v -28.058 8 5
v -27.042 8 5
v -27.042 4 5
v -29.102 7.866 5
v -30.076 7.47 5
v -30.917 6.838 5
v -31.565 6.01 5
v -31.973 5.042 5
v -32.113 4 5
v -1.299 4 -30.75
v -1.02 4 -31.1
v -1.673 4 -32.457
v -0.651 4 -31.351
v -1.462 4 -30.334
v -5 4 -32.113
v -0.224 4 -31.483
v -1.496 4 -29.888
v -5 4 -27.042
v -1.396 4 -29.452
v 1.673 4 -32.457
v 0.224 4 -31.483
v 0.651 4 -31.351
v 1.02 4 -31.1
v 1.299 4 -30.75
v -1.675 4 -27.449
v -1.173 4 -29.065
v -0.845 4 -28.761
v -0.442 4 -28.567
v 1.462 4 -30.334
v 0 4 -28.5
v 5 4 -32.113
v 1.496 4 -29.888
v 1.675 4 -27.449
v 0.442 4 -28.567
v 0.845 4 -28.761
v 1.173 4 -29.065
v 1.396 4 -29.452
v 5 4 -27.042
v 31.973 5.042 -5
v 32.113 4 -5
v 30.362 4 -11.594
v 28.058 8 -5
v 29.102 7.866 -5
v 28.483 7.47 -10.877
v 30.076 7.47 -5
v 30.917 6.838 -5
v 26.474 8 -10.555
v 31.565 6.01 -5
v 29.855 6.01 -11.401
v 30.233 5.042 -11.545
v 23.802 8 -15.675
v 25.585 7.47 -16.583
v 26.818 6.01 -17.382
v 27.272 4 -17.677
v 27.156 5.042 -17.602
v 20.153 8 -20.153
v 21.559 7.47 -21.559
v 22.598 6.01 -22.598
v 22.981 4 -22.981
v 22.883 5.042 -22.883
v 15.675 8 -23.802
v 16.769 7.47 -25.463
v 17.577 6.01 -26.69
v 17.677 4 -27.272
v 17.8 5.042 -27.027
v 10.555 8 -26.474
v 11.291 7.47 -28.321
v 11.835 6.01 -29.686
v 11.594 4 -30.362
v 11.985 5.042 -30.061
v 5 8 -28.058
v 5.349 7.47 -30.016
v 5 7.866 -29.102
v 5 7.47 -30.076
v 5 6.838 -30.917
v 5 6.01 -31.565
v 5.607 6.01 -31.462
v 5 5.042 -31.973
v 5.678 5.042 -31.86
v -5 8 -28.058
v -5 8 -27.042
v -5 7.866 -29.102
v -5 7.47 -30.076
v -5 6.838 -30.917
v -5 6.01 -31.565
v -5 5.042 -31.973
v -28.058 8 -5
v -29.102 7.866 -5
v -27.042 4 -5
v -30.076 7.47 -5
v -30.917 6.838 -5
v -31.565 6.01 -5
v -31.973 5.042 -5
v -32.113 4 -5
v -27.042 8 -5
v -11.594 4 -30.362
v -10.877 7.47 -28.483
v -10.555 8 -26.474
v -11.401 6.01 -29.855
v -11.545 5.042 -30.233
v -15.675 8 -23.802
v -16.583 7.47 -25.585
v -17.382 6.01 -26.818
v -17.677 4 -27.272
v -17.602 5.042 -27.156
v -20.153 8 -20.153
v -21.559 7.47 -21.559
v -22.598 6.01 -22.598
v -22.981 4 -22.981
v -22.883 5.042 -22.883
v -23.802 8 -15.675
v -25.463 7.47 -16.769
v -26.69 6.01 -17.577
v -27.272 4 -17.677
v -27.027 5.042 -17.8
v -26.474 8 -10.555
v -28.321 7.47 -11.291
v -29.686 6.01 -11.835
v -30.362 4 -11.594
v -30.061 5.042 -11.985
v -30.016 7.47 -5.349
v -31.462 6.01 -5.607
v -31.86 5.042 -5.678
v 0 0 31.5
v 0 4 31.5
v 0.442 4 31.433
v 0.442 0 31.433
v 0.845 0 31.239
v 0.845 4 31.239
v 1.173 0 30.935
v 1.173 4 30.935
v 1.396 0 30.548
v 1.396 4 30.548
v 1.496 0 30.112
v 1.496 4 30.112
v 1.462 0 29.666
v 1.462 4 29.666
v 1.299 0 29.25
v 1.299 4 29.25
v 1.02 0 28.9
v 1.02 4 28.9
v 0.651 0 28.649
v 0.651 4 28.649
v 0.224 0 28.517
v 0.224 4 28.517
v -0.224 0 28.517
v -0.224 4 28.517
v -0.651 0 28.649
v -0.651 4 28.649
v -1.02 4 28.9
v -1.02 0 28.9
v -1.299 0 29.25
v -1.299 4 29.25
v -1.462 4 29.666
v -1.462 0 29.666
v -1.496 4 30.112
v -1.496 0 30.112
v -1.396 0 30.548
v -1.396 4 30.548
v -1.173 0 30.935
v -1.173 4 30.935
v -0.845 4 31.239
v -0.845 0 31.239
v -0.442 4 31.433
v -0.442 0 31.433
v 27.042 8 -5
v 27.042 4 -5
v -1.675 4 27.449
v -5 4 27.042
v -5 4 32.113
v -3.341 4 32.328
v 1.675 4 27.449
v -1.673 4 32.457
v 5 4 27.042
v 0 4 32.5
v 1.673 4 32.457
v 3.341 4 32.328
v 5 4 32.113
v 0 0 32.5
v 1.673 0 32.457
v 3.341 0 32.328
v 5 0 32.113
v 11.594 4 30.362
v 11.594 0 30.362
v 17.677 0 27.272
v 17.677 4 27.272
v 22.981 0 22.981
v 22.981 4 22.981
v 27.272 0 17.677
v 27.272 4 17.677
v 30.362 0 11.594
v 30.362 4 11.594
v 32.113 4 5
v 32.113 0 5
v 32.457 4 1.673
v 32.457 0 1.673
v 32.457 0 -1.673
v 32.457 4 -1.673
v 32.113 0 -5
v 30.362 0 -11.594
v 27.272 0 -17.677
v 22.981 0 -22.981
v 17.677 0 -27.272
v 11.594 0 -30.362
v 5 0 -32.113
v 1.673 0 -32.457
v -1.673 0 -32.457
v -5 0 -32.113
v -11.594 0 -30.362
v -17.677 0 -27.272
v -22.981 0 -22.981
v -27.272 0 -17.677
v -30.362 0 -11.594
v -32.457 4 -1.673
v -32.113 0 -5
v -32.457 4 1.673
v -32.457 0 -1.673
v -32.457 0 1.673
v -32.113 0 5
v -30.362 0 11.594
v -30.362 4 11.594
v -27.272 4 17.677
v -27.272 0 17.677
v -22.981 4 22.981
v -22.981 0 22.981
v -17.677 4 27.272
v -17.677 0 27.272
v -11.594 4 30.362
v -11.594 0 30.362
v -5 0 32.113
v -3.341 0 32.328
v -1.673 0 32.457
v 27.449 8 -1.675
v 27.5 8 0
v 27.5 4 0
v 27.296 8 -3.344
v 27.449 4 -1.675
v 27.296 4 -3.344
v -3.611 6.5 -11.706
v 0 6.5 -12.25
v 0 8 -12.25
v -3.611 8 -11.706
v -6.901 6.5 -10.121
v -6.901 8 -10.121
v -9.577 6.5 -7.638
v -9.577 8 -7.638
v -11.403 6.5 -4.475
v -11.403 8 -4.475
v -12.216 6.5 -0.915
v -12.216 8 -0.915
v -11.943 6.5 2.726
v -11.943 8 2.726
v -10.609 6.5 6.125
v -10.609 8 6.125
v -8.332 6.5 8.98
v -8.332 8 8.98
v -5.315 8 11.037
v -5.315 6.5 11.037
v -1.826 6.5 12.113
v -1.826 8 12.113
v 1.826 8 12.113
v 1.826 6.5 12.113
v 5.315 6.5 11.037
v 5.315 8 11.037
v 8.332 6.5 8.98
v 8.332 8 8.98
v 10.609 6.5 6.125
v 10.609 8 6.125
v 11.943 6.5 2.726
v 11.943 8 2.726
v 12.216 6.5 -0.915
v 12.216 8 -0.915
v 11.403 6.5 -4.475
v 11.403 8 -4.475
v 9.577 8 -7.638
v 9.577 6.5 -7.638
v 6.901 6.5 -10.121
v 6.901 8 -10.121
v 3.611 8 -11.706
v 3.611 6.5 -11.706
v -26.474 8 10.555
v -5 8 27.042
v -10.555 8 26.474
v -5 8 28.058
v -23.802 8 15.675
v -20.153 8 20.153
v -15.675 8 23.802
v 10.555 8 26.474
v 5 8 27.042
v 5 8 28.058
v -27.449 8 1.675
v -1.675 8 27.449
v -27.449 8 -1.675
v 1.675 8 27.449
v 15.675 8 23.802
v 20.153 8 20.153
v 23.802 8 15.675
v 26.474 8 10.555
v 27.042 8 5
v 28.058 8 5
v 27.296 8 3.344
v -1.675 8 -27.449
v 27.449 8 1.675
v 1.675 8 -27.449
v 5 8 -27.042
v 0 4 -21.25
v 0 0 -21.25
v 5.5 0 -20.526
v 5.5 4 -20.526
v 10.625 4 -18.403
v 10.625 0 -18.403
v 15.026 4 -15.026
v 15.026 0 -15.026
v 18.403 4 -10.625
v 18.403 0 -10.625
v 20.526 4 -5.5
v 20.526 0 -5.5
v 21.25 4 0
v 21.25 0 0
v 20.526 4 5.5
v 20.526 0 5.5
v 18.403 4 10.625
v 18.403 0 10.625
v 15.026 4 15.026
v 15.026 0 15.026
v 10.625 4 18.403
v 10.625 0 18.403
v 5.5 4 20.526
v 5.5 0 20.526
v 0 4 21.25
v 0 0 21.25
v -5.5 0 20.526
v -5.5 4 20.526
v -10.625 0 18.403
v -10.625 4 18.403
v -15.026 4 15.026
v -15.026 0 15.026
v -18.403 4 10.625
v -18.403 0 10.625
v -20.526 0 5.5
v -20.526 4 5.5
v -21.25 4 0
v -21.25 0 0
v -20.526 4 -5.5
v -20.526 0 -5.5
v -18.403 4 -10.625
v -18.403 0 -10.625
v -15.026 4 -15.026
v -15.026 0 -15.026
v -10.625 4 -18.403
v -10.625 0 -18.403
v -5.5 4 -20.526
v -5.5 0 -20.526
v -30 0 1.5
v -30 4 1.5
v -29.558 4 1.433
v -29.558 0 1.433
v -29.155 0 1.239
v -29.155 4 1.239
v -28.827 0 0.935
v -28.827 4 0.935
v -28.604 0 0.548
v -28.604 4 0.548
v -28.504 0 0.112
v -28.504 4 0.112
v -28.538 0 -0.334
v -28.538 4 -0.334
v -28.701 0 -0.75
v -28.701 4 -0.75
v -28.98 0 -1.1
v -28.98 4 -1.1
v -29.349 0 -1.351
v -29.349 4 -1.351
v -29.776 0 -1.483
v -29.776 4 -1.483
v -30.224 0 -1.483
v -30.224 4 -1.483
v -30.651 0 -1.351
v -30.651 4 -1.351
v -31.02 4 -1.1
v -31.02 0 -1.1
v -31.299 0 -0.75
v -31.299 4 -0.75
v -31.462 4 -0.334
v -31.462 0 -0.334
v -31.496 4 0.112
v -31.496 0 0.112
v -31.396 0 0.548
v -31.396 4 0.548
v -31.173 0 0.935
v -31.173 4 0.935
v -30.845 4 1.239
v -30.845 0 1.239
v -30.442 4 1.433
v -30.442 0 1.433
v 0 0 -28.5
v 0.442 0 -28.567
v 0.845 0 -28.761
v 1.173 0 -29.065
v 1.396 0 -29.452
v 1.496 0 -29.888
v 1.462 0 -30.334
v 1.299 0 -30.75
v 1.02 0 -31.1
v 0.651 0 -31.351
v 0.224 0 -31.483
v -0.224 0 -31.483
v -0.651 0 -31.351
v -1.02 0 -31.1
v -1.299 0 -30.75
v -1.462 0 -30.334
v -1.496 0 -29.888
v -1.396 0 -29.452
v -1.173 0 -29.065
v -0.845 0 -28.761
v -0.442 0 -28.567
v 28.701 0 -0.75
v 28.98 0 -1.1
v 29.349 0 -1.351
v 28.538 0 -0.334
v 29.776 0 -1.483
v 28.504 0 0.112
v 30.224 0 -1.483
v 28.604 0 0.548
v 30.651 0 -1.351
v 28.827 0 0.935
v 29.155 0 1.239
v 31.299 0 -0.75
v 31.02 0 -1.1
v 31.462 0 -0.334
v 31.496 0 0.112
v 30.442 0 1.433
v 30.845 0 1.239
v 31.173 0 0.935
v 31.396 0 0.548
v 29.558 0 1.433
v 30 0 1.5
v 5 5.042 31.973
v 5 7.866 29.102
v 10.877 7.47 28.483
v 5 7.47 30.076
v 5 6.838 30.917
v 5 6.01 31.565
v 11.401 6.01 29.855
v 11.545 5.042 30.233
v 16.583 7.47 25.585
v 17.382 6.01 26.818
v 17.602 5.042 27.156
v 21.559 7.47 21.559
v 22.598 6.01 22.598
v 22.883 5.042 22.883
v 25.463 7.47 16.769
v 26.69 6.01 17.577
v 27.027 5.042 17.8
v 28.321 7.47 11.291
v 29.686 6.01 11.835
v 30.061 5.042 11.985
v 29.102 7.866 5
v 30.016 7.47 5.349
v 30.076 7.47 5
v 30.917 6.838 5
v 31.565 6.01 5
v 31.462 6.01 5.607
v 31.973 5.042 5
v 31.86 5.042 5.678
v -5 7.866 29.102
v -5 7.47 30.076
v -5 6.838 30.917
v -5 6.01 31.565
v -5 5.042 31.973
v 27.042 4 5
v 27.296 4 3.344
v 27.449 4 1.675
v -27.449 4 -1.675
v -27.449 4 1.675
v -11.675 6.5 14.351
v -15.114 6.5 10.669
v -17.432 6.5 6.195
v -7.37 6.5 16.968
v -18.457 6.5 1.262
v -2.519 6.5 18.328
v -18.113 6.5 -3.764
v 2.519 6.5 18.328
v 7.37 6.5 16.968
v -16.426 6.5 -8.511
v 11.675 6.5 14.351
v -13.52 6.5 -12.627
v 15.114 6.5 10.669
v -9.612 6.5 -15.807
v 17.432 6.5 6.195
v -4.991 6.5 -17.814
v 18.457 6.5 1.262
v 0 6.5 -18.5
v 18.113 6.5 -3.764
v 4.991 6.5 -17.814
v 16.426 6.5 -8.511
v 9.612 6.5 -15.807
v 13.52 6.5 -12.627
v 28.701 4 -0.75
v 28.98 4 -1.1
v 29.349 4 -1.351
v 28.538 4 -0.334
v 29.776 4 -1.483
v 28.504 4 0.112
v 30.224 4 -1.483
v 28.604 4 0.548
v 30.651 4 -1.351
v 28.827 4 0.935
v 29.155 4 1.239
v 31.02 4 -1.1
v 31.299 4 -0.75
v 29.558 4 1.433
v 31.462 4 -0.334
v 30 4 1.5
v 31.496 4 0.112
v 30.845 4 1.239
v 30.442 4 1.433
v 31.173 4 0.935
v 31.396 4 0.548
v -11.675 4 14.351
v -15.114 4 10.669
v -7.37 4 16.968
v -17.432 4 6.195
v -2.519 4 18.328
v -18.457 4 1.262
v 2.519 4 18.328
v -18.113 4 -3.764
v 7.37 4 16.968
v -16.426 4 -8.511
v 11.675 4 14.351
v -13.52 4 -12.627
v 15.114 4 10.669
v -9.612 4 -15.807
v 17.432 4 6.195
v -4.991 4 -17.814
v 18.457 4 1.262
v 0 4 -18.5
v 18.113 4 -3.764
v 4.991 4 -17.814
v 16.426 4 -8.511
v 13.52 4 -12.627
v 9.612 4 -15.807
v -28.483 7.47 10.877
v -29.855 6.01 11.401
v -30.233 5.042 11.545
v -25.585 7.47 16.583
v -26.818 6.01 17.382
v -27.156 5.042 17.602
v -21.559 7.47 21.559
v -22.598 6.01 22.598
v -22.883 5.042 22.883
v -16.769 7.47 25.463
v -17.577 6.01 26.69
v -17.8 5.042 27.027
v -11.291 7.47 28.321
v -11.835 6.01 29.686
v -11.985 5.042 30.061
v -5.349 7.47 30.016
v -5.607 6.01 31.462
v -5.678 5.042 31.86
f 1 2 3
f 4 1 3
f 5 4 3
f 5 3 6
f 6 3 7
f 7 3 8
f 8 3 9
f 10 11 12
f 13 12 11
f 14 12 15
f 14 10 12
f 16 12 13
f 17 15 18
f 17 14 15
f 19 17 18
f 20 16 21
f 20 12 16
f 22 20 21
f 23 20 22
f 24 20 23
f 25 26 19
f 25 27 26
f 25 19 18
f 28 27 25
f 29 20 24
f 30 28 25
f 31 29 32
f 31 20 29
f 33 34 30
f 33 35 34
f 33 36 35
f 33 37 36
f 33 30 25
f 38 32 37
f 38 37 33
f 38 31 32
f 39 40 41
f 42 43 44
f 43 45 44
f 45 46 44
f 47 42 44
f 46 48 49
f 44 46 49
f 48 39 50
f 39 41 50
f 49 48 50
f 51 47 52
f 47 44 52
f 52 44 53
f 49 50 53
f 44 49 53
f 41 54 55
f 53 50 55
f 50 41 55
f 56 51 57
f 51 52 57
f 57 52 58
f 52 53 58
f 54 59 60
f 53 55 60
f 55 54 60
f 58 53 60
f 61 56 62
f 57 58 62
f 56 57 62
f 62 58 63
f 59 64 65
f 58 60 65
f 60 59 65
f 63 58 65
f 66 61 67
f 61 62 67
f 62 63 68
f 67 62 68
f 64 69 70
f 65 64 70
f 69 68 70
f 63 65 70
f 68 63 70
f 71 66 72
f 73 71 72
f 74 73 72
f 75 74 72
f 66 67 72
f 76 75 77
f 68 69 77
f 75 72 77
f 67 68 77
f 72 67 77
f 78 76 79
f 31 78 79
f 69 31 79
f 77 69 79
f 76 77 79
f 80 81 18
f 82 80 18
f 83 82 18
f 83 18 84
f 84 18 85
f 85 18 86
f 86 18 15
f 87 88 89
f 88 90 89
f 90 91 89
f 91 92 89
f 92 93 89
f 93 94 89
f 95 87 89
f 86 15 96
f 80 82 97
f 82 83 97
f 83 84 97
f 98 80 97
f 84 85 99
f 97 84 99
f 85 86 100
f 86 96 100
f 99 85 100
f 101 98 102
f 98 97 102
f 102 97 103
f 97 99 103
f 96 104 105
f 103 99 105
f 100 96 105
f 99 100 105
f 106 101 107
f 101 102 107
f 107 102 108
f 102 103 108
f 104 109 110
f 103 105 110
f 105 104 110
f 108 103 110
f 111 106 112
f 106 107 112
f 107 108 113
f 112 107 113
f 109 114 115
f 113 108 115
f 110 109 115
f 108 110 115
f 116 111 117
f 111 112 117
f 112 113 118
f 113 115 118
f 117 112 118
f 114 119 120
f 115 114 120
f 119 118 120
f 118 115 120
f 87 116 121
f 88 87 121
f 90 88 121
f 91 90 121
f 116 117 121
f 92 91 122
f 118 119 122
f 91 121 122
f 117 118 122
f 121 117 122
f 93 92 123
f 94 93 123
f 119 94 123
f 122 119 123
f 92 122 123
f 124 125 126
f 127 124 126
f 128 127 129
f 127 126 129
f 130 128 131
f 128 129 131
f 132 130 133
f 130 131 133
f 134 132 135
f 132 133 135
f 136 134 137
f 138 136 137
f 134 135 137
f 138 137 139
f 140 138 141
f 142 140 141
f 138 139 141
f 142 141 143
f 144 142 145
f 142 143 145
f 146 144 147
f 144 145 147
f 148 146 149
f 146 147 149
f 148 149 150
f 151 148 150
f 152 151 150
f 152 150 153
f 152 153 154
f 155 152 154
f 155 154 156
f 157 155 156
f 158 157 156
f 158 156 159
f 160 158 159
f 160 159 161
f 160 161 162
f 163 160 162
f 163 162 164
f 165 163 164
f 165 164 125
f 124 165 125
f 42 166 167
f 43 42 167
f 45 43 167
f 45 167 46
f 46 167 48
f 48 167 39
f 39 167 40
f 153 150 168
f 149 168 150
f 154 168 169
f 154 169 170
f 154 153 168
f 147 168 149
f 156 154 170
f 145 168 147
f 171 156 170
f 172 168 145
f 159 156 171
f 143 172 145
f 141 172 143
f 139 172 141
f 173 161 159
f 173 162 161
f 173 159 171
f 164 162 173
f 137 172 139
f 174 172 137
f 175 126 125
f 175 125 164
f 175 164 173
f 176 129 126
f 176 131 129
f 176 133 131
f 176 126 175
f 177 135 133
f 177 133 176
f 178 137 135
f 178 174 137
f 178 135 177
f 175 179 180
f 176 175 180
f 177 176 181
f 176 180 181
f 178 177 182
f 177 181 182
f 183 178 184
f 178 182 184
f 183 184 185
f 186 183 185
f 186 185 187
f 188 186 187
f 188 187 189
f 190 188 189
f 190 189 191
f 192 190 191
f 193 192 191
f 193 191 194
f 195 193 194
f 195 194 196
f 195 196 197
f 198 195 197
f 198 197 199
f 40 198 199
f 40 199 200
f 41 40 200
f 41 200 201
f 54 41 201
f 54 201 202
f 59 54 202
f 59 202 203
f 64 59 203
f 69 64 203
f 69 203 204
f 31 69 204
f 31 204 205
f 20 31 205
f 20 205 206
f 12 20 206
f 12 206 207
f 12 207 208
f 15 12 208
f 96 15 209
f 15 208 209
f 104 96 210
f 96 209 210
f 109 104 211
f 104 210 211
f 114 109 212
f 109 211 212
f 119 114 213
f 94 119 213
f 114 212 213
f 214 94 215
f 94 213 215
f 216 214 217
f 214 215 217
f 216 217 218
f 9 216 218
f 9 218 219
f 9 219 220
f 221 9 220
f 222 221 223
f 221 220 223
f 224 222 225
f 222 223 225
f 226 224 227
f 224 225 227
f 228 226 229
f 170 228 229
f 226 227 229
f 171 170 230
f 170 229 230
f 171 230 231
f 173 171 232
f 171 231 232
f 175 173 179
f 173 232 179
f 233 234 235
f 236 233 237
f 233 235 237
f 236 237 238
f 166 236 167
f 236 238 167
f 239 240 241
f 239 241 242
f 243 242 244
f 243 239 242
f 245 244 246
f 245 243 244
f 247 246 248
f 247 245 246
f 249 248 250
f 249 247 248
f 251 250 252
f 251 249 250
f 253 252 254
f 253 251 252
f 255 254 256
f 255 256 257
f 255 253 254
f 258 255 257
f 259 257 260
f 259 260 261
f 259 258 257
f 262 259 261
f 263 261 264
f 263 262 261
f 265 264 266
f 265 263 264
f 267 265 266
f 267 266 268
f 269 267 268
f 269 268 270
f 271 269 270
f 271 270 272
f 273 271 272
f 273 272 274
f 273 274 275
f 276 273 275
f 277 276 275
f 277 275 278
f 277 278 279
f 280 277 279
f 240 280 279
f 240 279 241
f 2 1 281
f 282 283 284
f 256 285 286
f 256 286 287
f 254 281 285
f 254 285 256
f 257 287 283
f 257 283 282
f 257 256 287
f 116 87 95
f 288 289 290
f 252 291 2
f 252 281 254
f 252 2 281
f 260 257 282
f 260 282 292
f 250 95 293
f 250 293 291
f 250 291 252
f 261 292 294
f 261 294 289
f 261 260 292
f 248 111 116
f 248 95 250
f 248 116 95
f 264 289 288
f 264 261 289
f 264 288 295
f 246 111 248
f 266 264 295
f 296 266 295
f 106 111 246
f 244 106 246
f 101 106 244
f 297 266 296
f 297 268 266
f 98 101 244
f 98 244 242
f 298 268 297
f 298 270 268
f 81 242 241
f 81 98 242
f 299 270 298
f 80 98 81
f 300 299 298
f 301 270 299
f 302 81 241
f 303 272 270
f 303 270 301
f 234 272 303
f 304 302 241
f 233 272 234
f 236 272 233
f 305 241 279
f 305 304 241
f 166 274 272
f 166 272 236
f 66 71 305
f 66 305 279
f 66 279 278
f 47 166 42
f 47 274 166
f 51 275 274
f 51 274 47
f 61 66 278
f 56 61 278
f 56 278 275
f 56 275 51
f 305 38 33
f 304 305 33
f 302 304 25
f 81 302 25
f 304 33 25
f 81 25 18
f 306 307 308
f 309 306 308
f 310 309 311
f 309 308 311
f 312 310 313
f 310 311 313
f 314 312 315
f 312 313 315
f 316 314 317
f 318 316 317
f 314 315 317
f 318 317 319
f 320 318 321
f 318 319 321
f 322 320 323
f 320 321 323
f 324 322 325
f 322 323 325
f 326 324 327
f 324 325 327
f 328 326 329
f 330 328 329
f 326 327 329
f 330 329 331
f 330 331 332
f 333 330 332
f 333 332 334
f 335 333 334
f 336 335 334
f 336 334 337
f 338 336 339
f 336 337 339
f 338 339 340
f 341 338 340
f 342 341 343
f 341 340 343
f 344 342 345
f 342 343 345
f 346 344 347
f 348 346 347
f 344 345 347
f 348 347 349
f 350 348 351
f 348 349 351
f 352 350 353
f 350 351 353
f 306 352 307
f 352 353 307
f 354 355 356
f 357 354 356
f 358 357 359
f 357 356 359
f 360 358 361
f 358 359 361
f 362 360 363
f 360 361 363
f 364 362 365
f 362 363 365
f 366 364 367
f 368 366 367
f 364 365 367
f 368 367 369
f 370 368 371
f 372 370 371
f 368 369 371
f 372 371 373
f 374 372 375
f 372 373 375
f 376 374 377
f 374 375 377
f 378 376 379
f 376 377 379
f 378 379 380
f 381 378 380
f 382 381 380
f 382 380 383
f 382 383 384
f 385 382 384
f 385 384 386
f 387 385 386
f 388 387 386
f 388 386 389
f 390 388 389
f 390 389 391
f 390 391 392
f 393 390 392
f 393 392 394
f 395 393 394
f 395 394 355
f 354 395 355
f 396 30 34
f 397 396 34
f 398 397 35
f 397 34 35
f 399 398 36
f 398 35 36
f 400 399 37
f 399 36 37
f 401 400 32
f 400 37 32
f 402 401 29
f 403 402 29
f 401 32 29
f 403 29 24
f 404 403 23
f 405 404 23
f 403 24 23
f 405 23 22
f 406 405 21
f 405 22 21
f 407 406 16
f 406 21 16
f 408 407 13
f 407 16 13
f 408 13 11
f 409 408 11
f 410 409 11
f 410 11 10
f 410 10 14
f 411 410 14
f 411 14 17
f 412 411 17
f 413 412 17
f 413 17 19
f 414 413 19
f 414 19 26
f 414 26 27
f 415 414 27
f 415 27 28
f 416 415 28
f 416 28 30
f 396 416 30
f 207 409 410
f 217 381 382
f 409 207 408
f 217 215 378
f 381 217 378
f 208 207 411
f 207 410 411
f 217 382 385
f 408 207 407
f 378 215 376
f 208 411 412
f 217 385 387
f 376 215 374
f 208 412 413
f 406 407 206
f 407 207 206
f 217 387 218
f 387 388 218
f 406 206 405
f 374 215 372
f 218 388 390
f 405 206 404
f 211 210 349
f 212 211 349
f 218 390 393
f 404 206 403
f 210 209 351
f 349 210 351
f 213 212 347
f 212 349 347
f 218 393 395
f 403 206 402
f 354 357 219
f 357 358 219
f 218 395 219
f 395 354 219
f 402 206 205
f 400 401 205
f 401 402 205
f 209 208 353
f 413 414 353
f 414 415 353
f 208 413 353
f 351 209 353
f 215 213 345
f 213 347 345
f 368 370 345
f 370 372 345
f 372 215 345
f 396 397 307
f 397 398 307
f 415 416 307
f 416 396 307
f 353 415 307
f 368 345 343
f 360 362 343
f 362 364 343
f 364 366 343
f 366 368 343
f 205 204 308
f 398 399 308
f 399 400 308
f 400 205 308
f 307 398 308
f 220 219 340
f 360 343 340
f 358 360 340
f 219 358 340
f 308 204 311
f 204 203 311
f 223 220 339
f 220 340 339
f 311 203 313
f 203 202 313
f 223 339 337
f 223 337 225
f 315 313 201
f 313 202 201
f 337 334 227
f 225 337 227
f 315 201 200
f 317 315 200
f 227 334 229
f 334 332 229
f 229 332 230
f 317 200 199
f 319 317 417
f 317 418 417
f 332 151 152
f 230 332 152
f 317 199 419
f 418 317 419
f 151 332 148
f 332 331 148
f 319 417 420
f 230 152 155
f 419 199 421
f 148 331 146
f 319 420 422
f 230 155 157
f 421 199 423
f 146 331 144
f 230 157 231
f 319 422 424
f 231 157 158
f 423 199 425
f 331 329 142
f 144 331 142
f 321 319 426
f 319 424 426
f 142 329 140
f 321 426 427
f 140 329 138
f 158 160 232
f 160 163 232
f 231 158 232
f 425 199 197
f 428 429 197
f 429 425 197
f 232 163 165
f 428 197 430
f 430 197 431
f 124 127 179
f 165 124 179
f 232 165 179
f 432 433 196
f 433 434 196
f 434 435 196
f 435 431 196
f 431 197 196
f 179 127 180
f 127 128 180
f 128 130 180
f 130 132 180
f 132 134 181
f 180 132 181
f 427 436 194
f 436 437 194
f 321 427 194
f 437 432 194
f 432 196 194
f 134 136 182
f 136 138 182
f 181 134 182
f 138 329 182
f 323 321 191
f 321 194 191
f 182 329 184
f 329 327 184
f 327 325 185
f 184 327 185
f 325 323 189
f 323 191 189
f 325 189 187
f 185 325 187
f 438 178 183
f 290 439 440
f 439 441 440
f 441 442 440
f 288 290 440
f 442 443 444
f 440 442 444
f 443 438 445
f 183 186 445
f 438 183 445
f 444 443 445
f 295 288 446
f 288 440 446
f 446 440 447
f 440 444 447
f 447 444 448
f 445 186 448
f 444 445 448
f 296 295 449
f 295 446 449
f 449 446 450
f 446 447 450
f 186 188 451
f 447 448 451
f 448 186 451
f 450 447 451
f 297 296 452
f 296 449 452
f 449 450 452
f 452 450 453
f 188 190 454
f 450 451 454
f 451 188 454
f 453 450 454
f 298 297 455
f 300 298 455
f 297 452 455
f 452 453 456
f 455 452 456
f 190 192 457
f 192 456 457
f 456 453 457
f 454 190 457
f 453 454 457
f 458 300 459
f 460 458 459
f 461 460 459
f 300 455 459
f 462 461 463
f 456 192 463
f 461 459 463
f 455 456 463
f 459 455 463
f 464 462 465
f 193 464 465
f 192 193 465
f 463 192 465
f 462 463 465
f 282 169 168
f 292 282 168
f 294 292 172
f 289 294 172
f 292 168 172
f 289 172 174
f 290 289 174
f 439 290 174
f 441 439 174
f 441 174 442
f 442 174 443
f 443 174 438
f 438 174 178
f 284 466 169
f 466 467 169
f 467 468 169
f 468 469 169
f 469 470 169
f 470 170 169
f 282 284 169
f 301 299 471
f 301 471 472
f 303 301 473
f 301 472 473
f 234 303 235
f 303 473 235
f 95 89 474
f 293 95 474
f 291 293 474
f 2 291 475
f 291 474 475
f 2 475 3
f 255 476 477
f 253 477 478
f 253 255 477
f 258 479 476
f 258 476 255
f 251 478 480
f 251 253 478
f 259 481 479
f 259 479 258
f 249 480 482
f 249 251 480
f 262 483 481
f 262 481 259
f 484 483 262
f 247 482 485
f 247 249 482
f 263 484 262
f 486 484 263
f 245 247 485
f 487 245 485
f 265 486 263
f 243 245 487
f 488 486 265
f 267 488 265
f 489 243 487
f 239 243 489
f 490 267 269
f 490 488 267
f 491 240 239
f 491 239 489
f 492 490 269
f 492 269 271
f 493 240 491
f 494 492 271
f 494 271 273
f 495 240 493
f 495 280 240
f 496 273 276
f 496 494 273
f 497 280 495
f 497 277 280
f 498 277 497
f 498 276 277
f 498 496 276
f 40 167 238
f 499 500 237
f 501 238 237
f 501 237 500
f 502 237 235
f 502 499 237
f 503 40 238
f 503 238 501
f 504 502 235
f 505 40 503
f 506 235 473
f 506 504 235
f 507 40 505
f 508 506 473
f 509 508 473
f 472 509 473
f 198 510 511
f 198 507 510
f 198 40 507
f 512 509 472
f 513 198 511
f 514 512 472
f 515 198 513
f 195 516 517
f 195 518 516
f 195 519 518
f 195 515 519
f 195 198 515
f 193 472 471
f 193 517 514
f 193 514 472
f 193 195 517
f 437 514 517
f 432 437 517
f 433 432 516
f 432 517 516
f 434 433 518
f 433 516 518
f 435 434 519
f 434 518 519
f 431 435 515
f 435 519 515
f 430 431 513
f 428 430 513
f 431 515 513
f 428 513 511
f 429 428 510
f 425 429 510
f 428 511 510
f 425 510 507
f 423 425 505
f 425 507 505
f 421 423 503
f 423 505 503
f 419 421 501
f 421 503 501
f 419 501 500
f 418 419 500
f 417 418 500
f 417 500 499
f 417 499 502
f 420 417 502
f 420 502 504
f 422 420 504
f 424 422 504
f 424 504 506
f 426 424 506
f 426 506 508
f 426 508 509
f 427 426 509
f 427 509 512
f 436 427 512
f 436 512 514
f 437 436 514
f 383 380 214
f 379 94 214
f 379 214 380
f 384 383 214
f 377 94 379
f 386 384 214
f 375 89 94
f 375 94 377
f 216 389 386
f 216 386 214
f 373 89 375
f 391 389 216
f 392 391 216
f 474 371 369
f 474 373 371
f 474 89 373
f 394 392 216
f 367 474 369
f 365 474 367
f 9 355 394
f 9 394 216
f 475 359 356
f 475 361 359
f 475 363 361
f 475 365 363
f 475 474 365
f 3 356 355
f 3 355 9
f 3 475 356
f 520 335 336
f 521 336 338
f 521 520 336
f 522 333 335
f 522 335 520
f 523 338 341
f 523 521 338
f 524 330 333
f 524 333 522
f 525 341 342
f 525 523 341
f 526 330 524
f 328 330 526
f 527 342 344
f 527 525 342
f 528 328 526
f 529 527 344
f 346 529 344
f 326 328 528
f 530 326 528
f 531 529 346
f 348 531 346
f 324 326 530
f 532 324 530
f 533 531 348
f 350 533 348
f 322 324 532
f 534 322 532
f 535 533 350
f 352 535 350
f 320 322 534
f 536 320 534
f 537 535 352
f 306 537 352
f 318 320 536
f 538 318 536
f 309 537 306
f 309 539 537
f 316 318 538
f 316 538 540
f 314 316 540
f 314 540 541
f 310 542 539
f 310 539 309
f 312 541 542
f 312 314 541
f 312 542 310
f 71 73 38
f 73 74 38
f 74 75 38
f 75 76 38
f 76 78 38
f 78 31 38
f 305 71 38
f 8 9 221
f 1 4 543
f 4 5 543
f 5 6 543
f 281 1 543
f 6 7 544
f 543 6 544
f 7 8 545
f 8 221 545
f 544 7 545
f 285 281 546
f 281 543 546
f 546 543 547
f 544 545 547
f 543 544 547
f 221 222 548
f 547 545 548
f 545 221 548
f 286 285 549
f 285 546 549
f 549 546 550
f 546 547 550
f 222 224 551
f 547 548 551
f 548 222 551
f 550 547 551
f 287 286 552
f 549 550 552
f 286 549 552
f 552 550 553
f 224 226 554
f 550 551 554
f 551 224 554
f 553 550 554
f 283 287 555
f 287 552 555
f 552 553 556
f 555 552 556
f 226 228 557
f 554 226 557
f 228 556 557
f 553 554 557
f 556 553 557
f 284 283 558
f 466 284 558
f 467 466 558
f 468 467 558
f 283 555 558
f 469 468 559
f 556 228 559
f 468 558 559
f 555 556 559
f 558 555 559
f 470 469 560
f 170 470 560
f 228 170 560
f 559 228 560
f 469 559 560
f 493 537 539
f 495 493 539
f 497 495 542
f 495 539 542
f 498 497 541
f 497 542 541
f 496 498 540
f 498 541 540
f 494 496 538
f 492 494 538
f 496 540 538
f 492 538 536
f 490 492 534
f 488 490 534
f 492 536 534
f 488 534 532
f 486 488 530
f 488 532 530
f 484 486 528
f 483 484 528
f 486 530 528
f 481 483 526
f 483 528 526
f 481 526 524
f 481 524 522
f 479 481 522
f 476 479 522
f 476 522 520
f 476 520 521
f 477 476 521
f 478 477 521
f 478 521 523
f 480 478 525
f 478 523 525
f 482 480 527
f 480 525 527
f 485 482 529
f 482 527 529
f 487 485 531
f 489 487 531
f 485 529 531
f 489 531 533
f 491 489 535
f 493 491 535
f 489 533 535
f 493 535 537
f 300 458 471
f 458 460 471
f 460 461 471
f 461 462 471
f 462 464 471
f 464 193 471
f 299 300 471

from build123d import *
from build123d.topology import SkipClean

# Parameters (mm, degrees)
SKETCH1_R           = 32.5
SKETCH1_R_2         = 27.5
BOSS_EXTRUDE1_DEPTH = 4
BOSS_EXTRUDE2_DEPTH = 4
SKETCH3_R           = 1.5
CUT_EXTRUDE1_DEPTH  = 6
BOSS_EXTRUDE4_START = -8
SKETCH7_R           = 25
BOSS_EXTRUDE4_DEPTH = 8
SKETCH8_R           = 27.5
SKETCH8_R_2         = 12.25
BOSS_EXTRUDE5_DEPTH = 4
SKETCH10_R          = 25
SKETCH10_R_2        = 12.25
BOSS_EXTRUDE6_DEPTH = 4
FILLET3_R           = 4
SKETCH11_R          = 21.25
CUT_EXTRUDE2_DEPTH  = 4
SKETCH14_R          = 18.5
CUT_EXTRUDE3_DEPTH  = 2.5


with BuildPart() as part:
    # Sketch1 → Boss-Extrude1 (new body)
    with BuildSketch(Plane(origin=(0, 0, 0), x_dir=(1, 0, 0), z_dir=(0, 1, 0))):
        with Locations(Location((0, 0, 0), (0, 0, 270))):
            Circle(SKETCH1_R)
        with Locations(Location((0, 0, 0), (0, 0, 270))):
            Circle(SKETCH1_R_2, mode=Mode.SUBTRACT)
    extrude(amount=BOSS_EXTRUDE1_DEPTH)

    # Sketch2 → Boss-Extrude2 (add)
    with SkipClean():  # the faces are left unmerged after this step: merging them gives an invalid solid
        with BuildSketch(Plane(origin=(0, 4, 0), x_dir=(1, 0, 0), z_dir=(0, 1, 0))):
            with BuildLine():
                ThreePointArc((-5, 32.113081447), (-22.980970389, 22.980970389), (-32.113081447, 5))
                Line((-32.113081447, 5), (-30, 5))
                Line((-30, 5), (-27.041634566, 5))
                ThreePointArc((-27.041634566, 5), (-19.445436483, 19.445436483), (-5, 27.041634566))
                Line((-5, 27.041634566), (-5, 32.113081447))
            make_face()
            with BuildLine():
                Line((-27.041634566, -5), (-32.113081447, -5))
                ThreePointArc((-32.113081447, -5), (-22.980970389, -22.980970389), (-5, -32.113081447))
                Line((-5, -32.113081447), (-5, -27.041634566))
                ThreePointArc((-5, -27.041634566), (-19.445436483, -19.445436483), (-27.041634566, -5))
            make_face()
            with BuildLine():
                Line((5, -27.041634566), (5, -32.113081447))
                ThreePointArc((5, -32.113081447), (22.980970389, -22.980970389), (32.113081447, -5))
                Line((32.113081447, -5), (27.041634566, -5))
                ThreePointArc((27.041634566, -5), (19.445436483, -19.445436483), (5, -27.041634566))
            make_face()
            with BuildLine():
                ThreePointArc((32.113081447, 5), (22.980970389, 22.980970389), (5, 32.113081447))
                Line((5, 32.113081447), (5, 27.041634566))
                ThreePointArc((5, 27.041634566), (19.445436483, 19.445436483), (27.041634566, 5))
                Line((27.041634566, 5), (32.113081447, 5))
            make_face()
        extrude(amount=BOSS_EXTRUDE2_DEPTH)

    # Sketch3 → Cut-Extrude1 (cut)
    with SkipClean():  # the faces are left unmerged after this step: merging them gives an invalid solid
        with BuildSketch(Plane(origin=(0, 4, 0), x_dir=(1, 0, 0), z_dir=(0, 1, 0))):
            with Locations(Location((0, 30, 0), (0, 0, 270))):
                Circle(SKETCH3_R)
            with Locations(Location((30, 0, 0), (0, 0, 270))):
                Circle(SKETCH3_R)
            with Locations(Location((0, -30, 0), (0, 0, 270))):
                Circle(SKETCH3_R)
            with Locations(Location((-30, 0, 0), (0, 0, 270))):
                Circle(SKETCH3_R)
        extrude(amount=-CUT_EXTRUDE1_DEPTH, mode=Mode.SUBTRACT)

    # Sketch7 → Boss-Extrude4 (add)
    # profile 1 of 5: a face of its own
    with BuildSketch(Plane(origin=(0, 8, 0), x_dir=(1, 0, 0), z_dir=(0, 1, 0)).offset(BOSS_EXTRUDE4_START)):
        with BuildLine():
            ThreePointArc((-27.041634566, 5), (-19.445436483, 19.445436483), (-5, 27.041634566))
            Line((-5, 27.041634566), (-5, 32.113081447))
            ThreePointArc((-5, 32.113081447), (-22.980970389, 22.980970389), (-32.113081447, 5))
            Line((-32.113081447, 5), (-27.041634566, 5))
        make_face()
    # profile 2 of 5: a face of its own
    with BuildSketch(Plane(origin=(0, 8, 0), x_dir=(1, 0, 0), z_dir=(0, 1, 0)).offset(BOSS_EXTRUDE4_START)):
        with BuildLine():
            Line((27.041634566, 5), (32.113081447, 5))
            ThreePointArc((32.113081447, 5), (22.980970389, 22.980970389), (5, 32.113081447))
            Line((5, 32.113081447), (5, 27.041634566))
            ThreePointArc((5, 27.041634566), (19.445436483, 19.445436483), (27.041634566, 5))
        make_face()
    # profile 3 of 5: a face of its own
    with BuildSketch(Plane(origin=(0, 8, 0), x_dir=(1, 0, 0), z_dir=(0, 1, 0)).offset(BOSS_EXTRUDE4_START)):
        with BuildLine():
            Line((5, -27.041634566), (5, -32.113081447))
            ThreePointArc((5, -32.113081447), (22.980970389, -22.980970389), (32.113081447, -5))
            Line((32.113081447, -5), (27.041634566, -5))
            ThreePointArc((27.041634566, -5), (19.445436483, -19.445436483), (5, -27.041634566))
        make_face()
    # profile 4 of 5: a face of its own
    with BuildSketch(Plane(origin=(0, 8, 0), x_dir=(1, 0, 0), z_dir=(0, 1, 0)).offset(BOSS_EXTRUDE4_START)):
        with BuildLine():
            Line((-27.041634566, -5), (-32.113081447, -5))
            ThreePointArc((-32.113081447, -5), (-22.980970389, -22.980970389), (-5, -32.113081447))
            Line((-5, -32.113081447), (-5, -27.041634566))
            ThreePointArc((-5, -27.041634566), (-19.445436483, -19.445436483), (-27.041634566, -5))
        make_face()
    # profile 5 of 5: a face of its own
    with BuildSketch(Plane(origin=(0, 8, 0), x_dir=(1, 0, 0), z_dir=(0, 1, 0)).offset(BOSS_EXTRUDE4_START)):
        with BuildLine():
            ThreePointArc((-27.041634566, -5), (-19.445436483, -19.445436483), (-5, -27.041634566))
            ThreePointArc((-5, -27.041634566), (0, -27.5), (5, -27.041634566))
            ThreePointArc((5, -27.041634566), (19.445436483, -19.445436483), (27.041634566, -5))
            ThreePointArc((27.041634566, -5), (27.385168893, -2.510482965), (27.5, 0))
            ThreePointArc((27.5, 0), (27.385168893, 2.510482965), (27.041634566, 5))
            ThreePointArc((27.041634566, 5), (19.445436483, 19.445436483), (5, 27.041634566))
            ThreePointArc((5, 27.041634566), (0, 27.5), (-5, 27.041634566))
            ThreePointArc((-5, 27.041634566), (-19.445436483, 19.445436483), (-27.041634566, 5))
            ThreePointArc((-27.041634566, 5), (-27.5, 0), (-27.041634566, -5))
        make_face()
        with Locations(Location((0, 0, 0), (0, 0, 270))):
            Circle(SKETCH7_R, mode=Mode.SUBTRACT)
    extrude(amount=BOSS_EXTRUDE4_DEPTH)

    # Sketch8 → Boss-Extrude5 (add)
    with BuildSketch(Plane(origin=(0, 0, 0), x_dir=(-1, 0, 0), z_dir=(0, -1, 0))):
        Circle(SKETCH8_R)
        with Locations(Location((0, 0, 0), (0, 0, 90))):
            Circle(SKETCH8_R_2, mode=Mode.SUBTRACT)
    extrude(amount=-BOSS_EXTRUDE5_DEPTH)

    # Sketch10 → Boss-Extrude6 (add)
    with BuildSketch(Plane(origin=(0, 4, 0), x_dir=(1, 0, 0), z_dir=(0, 1, 0))):
        Circle(SKETCH10_R)
        with Locations(Location((0, 0, 0), (0, 0, 90))):
            Circle(SKETCH10_R_2, mode=Mode.SUBTRACT)
    extrude(amount=BOSS_EXTRUDE6_DEPTH)

    # Fillet3
    fillet3_edges = [part.edges().sort_by_distance(p)[0] for p in [
        (22.980970389, 8, -22.980970389),
        (22.980970389, 8, 22.980970389),
        (-22.980970389, 8, 22.980970389),
        (-22.980970389, 8, -22.980970389),
    ]]
    fillet(fillet3_edges, radius=FILLET3_R - 0.0001)  # a hair under: the kernel refuses the full size

    # Sketch11 → Cut-Extrude2 (cut)
    with BuildSketch(Plane.XZ):
        with Locations(Location((0, 0, 0), (0, 0, 270))):
            Circle(SKETCH11_R)
    extrude(amount=-CUT_EXTRUDE2_DEPTH, mode=Mode.SUBTRACT)

    # Sketch14 → Cut-Extrude3 (cut)
    with BuildSketch(Plane.XZ.offset(-4)):
        with Locations(Location((0, 0, 0), (0, 0, 270))):
            Circle(SKETCH14_R)
    extrude(amount=-CUT_EXTRUDE3_DEPTH, mode=Mode.SUBTRACT)


solid = part.part
